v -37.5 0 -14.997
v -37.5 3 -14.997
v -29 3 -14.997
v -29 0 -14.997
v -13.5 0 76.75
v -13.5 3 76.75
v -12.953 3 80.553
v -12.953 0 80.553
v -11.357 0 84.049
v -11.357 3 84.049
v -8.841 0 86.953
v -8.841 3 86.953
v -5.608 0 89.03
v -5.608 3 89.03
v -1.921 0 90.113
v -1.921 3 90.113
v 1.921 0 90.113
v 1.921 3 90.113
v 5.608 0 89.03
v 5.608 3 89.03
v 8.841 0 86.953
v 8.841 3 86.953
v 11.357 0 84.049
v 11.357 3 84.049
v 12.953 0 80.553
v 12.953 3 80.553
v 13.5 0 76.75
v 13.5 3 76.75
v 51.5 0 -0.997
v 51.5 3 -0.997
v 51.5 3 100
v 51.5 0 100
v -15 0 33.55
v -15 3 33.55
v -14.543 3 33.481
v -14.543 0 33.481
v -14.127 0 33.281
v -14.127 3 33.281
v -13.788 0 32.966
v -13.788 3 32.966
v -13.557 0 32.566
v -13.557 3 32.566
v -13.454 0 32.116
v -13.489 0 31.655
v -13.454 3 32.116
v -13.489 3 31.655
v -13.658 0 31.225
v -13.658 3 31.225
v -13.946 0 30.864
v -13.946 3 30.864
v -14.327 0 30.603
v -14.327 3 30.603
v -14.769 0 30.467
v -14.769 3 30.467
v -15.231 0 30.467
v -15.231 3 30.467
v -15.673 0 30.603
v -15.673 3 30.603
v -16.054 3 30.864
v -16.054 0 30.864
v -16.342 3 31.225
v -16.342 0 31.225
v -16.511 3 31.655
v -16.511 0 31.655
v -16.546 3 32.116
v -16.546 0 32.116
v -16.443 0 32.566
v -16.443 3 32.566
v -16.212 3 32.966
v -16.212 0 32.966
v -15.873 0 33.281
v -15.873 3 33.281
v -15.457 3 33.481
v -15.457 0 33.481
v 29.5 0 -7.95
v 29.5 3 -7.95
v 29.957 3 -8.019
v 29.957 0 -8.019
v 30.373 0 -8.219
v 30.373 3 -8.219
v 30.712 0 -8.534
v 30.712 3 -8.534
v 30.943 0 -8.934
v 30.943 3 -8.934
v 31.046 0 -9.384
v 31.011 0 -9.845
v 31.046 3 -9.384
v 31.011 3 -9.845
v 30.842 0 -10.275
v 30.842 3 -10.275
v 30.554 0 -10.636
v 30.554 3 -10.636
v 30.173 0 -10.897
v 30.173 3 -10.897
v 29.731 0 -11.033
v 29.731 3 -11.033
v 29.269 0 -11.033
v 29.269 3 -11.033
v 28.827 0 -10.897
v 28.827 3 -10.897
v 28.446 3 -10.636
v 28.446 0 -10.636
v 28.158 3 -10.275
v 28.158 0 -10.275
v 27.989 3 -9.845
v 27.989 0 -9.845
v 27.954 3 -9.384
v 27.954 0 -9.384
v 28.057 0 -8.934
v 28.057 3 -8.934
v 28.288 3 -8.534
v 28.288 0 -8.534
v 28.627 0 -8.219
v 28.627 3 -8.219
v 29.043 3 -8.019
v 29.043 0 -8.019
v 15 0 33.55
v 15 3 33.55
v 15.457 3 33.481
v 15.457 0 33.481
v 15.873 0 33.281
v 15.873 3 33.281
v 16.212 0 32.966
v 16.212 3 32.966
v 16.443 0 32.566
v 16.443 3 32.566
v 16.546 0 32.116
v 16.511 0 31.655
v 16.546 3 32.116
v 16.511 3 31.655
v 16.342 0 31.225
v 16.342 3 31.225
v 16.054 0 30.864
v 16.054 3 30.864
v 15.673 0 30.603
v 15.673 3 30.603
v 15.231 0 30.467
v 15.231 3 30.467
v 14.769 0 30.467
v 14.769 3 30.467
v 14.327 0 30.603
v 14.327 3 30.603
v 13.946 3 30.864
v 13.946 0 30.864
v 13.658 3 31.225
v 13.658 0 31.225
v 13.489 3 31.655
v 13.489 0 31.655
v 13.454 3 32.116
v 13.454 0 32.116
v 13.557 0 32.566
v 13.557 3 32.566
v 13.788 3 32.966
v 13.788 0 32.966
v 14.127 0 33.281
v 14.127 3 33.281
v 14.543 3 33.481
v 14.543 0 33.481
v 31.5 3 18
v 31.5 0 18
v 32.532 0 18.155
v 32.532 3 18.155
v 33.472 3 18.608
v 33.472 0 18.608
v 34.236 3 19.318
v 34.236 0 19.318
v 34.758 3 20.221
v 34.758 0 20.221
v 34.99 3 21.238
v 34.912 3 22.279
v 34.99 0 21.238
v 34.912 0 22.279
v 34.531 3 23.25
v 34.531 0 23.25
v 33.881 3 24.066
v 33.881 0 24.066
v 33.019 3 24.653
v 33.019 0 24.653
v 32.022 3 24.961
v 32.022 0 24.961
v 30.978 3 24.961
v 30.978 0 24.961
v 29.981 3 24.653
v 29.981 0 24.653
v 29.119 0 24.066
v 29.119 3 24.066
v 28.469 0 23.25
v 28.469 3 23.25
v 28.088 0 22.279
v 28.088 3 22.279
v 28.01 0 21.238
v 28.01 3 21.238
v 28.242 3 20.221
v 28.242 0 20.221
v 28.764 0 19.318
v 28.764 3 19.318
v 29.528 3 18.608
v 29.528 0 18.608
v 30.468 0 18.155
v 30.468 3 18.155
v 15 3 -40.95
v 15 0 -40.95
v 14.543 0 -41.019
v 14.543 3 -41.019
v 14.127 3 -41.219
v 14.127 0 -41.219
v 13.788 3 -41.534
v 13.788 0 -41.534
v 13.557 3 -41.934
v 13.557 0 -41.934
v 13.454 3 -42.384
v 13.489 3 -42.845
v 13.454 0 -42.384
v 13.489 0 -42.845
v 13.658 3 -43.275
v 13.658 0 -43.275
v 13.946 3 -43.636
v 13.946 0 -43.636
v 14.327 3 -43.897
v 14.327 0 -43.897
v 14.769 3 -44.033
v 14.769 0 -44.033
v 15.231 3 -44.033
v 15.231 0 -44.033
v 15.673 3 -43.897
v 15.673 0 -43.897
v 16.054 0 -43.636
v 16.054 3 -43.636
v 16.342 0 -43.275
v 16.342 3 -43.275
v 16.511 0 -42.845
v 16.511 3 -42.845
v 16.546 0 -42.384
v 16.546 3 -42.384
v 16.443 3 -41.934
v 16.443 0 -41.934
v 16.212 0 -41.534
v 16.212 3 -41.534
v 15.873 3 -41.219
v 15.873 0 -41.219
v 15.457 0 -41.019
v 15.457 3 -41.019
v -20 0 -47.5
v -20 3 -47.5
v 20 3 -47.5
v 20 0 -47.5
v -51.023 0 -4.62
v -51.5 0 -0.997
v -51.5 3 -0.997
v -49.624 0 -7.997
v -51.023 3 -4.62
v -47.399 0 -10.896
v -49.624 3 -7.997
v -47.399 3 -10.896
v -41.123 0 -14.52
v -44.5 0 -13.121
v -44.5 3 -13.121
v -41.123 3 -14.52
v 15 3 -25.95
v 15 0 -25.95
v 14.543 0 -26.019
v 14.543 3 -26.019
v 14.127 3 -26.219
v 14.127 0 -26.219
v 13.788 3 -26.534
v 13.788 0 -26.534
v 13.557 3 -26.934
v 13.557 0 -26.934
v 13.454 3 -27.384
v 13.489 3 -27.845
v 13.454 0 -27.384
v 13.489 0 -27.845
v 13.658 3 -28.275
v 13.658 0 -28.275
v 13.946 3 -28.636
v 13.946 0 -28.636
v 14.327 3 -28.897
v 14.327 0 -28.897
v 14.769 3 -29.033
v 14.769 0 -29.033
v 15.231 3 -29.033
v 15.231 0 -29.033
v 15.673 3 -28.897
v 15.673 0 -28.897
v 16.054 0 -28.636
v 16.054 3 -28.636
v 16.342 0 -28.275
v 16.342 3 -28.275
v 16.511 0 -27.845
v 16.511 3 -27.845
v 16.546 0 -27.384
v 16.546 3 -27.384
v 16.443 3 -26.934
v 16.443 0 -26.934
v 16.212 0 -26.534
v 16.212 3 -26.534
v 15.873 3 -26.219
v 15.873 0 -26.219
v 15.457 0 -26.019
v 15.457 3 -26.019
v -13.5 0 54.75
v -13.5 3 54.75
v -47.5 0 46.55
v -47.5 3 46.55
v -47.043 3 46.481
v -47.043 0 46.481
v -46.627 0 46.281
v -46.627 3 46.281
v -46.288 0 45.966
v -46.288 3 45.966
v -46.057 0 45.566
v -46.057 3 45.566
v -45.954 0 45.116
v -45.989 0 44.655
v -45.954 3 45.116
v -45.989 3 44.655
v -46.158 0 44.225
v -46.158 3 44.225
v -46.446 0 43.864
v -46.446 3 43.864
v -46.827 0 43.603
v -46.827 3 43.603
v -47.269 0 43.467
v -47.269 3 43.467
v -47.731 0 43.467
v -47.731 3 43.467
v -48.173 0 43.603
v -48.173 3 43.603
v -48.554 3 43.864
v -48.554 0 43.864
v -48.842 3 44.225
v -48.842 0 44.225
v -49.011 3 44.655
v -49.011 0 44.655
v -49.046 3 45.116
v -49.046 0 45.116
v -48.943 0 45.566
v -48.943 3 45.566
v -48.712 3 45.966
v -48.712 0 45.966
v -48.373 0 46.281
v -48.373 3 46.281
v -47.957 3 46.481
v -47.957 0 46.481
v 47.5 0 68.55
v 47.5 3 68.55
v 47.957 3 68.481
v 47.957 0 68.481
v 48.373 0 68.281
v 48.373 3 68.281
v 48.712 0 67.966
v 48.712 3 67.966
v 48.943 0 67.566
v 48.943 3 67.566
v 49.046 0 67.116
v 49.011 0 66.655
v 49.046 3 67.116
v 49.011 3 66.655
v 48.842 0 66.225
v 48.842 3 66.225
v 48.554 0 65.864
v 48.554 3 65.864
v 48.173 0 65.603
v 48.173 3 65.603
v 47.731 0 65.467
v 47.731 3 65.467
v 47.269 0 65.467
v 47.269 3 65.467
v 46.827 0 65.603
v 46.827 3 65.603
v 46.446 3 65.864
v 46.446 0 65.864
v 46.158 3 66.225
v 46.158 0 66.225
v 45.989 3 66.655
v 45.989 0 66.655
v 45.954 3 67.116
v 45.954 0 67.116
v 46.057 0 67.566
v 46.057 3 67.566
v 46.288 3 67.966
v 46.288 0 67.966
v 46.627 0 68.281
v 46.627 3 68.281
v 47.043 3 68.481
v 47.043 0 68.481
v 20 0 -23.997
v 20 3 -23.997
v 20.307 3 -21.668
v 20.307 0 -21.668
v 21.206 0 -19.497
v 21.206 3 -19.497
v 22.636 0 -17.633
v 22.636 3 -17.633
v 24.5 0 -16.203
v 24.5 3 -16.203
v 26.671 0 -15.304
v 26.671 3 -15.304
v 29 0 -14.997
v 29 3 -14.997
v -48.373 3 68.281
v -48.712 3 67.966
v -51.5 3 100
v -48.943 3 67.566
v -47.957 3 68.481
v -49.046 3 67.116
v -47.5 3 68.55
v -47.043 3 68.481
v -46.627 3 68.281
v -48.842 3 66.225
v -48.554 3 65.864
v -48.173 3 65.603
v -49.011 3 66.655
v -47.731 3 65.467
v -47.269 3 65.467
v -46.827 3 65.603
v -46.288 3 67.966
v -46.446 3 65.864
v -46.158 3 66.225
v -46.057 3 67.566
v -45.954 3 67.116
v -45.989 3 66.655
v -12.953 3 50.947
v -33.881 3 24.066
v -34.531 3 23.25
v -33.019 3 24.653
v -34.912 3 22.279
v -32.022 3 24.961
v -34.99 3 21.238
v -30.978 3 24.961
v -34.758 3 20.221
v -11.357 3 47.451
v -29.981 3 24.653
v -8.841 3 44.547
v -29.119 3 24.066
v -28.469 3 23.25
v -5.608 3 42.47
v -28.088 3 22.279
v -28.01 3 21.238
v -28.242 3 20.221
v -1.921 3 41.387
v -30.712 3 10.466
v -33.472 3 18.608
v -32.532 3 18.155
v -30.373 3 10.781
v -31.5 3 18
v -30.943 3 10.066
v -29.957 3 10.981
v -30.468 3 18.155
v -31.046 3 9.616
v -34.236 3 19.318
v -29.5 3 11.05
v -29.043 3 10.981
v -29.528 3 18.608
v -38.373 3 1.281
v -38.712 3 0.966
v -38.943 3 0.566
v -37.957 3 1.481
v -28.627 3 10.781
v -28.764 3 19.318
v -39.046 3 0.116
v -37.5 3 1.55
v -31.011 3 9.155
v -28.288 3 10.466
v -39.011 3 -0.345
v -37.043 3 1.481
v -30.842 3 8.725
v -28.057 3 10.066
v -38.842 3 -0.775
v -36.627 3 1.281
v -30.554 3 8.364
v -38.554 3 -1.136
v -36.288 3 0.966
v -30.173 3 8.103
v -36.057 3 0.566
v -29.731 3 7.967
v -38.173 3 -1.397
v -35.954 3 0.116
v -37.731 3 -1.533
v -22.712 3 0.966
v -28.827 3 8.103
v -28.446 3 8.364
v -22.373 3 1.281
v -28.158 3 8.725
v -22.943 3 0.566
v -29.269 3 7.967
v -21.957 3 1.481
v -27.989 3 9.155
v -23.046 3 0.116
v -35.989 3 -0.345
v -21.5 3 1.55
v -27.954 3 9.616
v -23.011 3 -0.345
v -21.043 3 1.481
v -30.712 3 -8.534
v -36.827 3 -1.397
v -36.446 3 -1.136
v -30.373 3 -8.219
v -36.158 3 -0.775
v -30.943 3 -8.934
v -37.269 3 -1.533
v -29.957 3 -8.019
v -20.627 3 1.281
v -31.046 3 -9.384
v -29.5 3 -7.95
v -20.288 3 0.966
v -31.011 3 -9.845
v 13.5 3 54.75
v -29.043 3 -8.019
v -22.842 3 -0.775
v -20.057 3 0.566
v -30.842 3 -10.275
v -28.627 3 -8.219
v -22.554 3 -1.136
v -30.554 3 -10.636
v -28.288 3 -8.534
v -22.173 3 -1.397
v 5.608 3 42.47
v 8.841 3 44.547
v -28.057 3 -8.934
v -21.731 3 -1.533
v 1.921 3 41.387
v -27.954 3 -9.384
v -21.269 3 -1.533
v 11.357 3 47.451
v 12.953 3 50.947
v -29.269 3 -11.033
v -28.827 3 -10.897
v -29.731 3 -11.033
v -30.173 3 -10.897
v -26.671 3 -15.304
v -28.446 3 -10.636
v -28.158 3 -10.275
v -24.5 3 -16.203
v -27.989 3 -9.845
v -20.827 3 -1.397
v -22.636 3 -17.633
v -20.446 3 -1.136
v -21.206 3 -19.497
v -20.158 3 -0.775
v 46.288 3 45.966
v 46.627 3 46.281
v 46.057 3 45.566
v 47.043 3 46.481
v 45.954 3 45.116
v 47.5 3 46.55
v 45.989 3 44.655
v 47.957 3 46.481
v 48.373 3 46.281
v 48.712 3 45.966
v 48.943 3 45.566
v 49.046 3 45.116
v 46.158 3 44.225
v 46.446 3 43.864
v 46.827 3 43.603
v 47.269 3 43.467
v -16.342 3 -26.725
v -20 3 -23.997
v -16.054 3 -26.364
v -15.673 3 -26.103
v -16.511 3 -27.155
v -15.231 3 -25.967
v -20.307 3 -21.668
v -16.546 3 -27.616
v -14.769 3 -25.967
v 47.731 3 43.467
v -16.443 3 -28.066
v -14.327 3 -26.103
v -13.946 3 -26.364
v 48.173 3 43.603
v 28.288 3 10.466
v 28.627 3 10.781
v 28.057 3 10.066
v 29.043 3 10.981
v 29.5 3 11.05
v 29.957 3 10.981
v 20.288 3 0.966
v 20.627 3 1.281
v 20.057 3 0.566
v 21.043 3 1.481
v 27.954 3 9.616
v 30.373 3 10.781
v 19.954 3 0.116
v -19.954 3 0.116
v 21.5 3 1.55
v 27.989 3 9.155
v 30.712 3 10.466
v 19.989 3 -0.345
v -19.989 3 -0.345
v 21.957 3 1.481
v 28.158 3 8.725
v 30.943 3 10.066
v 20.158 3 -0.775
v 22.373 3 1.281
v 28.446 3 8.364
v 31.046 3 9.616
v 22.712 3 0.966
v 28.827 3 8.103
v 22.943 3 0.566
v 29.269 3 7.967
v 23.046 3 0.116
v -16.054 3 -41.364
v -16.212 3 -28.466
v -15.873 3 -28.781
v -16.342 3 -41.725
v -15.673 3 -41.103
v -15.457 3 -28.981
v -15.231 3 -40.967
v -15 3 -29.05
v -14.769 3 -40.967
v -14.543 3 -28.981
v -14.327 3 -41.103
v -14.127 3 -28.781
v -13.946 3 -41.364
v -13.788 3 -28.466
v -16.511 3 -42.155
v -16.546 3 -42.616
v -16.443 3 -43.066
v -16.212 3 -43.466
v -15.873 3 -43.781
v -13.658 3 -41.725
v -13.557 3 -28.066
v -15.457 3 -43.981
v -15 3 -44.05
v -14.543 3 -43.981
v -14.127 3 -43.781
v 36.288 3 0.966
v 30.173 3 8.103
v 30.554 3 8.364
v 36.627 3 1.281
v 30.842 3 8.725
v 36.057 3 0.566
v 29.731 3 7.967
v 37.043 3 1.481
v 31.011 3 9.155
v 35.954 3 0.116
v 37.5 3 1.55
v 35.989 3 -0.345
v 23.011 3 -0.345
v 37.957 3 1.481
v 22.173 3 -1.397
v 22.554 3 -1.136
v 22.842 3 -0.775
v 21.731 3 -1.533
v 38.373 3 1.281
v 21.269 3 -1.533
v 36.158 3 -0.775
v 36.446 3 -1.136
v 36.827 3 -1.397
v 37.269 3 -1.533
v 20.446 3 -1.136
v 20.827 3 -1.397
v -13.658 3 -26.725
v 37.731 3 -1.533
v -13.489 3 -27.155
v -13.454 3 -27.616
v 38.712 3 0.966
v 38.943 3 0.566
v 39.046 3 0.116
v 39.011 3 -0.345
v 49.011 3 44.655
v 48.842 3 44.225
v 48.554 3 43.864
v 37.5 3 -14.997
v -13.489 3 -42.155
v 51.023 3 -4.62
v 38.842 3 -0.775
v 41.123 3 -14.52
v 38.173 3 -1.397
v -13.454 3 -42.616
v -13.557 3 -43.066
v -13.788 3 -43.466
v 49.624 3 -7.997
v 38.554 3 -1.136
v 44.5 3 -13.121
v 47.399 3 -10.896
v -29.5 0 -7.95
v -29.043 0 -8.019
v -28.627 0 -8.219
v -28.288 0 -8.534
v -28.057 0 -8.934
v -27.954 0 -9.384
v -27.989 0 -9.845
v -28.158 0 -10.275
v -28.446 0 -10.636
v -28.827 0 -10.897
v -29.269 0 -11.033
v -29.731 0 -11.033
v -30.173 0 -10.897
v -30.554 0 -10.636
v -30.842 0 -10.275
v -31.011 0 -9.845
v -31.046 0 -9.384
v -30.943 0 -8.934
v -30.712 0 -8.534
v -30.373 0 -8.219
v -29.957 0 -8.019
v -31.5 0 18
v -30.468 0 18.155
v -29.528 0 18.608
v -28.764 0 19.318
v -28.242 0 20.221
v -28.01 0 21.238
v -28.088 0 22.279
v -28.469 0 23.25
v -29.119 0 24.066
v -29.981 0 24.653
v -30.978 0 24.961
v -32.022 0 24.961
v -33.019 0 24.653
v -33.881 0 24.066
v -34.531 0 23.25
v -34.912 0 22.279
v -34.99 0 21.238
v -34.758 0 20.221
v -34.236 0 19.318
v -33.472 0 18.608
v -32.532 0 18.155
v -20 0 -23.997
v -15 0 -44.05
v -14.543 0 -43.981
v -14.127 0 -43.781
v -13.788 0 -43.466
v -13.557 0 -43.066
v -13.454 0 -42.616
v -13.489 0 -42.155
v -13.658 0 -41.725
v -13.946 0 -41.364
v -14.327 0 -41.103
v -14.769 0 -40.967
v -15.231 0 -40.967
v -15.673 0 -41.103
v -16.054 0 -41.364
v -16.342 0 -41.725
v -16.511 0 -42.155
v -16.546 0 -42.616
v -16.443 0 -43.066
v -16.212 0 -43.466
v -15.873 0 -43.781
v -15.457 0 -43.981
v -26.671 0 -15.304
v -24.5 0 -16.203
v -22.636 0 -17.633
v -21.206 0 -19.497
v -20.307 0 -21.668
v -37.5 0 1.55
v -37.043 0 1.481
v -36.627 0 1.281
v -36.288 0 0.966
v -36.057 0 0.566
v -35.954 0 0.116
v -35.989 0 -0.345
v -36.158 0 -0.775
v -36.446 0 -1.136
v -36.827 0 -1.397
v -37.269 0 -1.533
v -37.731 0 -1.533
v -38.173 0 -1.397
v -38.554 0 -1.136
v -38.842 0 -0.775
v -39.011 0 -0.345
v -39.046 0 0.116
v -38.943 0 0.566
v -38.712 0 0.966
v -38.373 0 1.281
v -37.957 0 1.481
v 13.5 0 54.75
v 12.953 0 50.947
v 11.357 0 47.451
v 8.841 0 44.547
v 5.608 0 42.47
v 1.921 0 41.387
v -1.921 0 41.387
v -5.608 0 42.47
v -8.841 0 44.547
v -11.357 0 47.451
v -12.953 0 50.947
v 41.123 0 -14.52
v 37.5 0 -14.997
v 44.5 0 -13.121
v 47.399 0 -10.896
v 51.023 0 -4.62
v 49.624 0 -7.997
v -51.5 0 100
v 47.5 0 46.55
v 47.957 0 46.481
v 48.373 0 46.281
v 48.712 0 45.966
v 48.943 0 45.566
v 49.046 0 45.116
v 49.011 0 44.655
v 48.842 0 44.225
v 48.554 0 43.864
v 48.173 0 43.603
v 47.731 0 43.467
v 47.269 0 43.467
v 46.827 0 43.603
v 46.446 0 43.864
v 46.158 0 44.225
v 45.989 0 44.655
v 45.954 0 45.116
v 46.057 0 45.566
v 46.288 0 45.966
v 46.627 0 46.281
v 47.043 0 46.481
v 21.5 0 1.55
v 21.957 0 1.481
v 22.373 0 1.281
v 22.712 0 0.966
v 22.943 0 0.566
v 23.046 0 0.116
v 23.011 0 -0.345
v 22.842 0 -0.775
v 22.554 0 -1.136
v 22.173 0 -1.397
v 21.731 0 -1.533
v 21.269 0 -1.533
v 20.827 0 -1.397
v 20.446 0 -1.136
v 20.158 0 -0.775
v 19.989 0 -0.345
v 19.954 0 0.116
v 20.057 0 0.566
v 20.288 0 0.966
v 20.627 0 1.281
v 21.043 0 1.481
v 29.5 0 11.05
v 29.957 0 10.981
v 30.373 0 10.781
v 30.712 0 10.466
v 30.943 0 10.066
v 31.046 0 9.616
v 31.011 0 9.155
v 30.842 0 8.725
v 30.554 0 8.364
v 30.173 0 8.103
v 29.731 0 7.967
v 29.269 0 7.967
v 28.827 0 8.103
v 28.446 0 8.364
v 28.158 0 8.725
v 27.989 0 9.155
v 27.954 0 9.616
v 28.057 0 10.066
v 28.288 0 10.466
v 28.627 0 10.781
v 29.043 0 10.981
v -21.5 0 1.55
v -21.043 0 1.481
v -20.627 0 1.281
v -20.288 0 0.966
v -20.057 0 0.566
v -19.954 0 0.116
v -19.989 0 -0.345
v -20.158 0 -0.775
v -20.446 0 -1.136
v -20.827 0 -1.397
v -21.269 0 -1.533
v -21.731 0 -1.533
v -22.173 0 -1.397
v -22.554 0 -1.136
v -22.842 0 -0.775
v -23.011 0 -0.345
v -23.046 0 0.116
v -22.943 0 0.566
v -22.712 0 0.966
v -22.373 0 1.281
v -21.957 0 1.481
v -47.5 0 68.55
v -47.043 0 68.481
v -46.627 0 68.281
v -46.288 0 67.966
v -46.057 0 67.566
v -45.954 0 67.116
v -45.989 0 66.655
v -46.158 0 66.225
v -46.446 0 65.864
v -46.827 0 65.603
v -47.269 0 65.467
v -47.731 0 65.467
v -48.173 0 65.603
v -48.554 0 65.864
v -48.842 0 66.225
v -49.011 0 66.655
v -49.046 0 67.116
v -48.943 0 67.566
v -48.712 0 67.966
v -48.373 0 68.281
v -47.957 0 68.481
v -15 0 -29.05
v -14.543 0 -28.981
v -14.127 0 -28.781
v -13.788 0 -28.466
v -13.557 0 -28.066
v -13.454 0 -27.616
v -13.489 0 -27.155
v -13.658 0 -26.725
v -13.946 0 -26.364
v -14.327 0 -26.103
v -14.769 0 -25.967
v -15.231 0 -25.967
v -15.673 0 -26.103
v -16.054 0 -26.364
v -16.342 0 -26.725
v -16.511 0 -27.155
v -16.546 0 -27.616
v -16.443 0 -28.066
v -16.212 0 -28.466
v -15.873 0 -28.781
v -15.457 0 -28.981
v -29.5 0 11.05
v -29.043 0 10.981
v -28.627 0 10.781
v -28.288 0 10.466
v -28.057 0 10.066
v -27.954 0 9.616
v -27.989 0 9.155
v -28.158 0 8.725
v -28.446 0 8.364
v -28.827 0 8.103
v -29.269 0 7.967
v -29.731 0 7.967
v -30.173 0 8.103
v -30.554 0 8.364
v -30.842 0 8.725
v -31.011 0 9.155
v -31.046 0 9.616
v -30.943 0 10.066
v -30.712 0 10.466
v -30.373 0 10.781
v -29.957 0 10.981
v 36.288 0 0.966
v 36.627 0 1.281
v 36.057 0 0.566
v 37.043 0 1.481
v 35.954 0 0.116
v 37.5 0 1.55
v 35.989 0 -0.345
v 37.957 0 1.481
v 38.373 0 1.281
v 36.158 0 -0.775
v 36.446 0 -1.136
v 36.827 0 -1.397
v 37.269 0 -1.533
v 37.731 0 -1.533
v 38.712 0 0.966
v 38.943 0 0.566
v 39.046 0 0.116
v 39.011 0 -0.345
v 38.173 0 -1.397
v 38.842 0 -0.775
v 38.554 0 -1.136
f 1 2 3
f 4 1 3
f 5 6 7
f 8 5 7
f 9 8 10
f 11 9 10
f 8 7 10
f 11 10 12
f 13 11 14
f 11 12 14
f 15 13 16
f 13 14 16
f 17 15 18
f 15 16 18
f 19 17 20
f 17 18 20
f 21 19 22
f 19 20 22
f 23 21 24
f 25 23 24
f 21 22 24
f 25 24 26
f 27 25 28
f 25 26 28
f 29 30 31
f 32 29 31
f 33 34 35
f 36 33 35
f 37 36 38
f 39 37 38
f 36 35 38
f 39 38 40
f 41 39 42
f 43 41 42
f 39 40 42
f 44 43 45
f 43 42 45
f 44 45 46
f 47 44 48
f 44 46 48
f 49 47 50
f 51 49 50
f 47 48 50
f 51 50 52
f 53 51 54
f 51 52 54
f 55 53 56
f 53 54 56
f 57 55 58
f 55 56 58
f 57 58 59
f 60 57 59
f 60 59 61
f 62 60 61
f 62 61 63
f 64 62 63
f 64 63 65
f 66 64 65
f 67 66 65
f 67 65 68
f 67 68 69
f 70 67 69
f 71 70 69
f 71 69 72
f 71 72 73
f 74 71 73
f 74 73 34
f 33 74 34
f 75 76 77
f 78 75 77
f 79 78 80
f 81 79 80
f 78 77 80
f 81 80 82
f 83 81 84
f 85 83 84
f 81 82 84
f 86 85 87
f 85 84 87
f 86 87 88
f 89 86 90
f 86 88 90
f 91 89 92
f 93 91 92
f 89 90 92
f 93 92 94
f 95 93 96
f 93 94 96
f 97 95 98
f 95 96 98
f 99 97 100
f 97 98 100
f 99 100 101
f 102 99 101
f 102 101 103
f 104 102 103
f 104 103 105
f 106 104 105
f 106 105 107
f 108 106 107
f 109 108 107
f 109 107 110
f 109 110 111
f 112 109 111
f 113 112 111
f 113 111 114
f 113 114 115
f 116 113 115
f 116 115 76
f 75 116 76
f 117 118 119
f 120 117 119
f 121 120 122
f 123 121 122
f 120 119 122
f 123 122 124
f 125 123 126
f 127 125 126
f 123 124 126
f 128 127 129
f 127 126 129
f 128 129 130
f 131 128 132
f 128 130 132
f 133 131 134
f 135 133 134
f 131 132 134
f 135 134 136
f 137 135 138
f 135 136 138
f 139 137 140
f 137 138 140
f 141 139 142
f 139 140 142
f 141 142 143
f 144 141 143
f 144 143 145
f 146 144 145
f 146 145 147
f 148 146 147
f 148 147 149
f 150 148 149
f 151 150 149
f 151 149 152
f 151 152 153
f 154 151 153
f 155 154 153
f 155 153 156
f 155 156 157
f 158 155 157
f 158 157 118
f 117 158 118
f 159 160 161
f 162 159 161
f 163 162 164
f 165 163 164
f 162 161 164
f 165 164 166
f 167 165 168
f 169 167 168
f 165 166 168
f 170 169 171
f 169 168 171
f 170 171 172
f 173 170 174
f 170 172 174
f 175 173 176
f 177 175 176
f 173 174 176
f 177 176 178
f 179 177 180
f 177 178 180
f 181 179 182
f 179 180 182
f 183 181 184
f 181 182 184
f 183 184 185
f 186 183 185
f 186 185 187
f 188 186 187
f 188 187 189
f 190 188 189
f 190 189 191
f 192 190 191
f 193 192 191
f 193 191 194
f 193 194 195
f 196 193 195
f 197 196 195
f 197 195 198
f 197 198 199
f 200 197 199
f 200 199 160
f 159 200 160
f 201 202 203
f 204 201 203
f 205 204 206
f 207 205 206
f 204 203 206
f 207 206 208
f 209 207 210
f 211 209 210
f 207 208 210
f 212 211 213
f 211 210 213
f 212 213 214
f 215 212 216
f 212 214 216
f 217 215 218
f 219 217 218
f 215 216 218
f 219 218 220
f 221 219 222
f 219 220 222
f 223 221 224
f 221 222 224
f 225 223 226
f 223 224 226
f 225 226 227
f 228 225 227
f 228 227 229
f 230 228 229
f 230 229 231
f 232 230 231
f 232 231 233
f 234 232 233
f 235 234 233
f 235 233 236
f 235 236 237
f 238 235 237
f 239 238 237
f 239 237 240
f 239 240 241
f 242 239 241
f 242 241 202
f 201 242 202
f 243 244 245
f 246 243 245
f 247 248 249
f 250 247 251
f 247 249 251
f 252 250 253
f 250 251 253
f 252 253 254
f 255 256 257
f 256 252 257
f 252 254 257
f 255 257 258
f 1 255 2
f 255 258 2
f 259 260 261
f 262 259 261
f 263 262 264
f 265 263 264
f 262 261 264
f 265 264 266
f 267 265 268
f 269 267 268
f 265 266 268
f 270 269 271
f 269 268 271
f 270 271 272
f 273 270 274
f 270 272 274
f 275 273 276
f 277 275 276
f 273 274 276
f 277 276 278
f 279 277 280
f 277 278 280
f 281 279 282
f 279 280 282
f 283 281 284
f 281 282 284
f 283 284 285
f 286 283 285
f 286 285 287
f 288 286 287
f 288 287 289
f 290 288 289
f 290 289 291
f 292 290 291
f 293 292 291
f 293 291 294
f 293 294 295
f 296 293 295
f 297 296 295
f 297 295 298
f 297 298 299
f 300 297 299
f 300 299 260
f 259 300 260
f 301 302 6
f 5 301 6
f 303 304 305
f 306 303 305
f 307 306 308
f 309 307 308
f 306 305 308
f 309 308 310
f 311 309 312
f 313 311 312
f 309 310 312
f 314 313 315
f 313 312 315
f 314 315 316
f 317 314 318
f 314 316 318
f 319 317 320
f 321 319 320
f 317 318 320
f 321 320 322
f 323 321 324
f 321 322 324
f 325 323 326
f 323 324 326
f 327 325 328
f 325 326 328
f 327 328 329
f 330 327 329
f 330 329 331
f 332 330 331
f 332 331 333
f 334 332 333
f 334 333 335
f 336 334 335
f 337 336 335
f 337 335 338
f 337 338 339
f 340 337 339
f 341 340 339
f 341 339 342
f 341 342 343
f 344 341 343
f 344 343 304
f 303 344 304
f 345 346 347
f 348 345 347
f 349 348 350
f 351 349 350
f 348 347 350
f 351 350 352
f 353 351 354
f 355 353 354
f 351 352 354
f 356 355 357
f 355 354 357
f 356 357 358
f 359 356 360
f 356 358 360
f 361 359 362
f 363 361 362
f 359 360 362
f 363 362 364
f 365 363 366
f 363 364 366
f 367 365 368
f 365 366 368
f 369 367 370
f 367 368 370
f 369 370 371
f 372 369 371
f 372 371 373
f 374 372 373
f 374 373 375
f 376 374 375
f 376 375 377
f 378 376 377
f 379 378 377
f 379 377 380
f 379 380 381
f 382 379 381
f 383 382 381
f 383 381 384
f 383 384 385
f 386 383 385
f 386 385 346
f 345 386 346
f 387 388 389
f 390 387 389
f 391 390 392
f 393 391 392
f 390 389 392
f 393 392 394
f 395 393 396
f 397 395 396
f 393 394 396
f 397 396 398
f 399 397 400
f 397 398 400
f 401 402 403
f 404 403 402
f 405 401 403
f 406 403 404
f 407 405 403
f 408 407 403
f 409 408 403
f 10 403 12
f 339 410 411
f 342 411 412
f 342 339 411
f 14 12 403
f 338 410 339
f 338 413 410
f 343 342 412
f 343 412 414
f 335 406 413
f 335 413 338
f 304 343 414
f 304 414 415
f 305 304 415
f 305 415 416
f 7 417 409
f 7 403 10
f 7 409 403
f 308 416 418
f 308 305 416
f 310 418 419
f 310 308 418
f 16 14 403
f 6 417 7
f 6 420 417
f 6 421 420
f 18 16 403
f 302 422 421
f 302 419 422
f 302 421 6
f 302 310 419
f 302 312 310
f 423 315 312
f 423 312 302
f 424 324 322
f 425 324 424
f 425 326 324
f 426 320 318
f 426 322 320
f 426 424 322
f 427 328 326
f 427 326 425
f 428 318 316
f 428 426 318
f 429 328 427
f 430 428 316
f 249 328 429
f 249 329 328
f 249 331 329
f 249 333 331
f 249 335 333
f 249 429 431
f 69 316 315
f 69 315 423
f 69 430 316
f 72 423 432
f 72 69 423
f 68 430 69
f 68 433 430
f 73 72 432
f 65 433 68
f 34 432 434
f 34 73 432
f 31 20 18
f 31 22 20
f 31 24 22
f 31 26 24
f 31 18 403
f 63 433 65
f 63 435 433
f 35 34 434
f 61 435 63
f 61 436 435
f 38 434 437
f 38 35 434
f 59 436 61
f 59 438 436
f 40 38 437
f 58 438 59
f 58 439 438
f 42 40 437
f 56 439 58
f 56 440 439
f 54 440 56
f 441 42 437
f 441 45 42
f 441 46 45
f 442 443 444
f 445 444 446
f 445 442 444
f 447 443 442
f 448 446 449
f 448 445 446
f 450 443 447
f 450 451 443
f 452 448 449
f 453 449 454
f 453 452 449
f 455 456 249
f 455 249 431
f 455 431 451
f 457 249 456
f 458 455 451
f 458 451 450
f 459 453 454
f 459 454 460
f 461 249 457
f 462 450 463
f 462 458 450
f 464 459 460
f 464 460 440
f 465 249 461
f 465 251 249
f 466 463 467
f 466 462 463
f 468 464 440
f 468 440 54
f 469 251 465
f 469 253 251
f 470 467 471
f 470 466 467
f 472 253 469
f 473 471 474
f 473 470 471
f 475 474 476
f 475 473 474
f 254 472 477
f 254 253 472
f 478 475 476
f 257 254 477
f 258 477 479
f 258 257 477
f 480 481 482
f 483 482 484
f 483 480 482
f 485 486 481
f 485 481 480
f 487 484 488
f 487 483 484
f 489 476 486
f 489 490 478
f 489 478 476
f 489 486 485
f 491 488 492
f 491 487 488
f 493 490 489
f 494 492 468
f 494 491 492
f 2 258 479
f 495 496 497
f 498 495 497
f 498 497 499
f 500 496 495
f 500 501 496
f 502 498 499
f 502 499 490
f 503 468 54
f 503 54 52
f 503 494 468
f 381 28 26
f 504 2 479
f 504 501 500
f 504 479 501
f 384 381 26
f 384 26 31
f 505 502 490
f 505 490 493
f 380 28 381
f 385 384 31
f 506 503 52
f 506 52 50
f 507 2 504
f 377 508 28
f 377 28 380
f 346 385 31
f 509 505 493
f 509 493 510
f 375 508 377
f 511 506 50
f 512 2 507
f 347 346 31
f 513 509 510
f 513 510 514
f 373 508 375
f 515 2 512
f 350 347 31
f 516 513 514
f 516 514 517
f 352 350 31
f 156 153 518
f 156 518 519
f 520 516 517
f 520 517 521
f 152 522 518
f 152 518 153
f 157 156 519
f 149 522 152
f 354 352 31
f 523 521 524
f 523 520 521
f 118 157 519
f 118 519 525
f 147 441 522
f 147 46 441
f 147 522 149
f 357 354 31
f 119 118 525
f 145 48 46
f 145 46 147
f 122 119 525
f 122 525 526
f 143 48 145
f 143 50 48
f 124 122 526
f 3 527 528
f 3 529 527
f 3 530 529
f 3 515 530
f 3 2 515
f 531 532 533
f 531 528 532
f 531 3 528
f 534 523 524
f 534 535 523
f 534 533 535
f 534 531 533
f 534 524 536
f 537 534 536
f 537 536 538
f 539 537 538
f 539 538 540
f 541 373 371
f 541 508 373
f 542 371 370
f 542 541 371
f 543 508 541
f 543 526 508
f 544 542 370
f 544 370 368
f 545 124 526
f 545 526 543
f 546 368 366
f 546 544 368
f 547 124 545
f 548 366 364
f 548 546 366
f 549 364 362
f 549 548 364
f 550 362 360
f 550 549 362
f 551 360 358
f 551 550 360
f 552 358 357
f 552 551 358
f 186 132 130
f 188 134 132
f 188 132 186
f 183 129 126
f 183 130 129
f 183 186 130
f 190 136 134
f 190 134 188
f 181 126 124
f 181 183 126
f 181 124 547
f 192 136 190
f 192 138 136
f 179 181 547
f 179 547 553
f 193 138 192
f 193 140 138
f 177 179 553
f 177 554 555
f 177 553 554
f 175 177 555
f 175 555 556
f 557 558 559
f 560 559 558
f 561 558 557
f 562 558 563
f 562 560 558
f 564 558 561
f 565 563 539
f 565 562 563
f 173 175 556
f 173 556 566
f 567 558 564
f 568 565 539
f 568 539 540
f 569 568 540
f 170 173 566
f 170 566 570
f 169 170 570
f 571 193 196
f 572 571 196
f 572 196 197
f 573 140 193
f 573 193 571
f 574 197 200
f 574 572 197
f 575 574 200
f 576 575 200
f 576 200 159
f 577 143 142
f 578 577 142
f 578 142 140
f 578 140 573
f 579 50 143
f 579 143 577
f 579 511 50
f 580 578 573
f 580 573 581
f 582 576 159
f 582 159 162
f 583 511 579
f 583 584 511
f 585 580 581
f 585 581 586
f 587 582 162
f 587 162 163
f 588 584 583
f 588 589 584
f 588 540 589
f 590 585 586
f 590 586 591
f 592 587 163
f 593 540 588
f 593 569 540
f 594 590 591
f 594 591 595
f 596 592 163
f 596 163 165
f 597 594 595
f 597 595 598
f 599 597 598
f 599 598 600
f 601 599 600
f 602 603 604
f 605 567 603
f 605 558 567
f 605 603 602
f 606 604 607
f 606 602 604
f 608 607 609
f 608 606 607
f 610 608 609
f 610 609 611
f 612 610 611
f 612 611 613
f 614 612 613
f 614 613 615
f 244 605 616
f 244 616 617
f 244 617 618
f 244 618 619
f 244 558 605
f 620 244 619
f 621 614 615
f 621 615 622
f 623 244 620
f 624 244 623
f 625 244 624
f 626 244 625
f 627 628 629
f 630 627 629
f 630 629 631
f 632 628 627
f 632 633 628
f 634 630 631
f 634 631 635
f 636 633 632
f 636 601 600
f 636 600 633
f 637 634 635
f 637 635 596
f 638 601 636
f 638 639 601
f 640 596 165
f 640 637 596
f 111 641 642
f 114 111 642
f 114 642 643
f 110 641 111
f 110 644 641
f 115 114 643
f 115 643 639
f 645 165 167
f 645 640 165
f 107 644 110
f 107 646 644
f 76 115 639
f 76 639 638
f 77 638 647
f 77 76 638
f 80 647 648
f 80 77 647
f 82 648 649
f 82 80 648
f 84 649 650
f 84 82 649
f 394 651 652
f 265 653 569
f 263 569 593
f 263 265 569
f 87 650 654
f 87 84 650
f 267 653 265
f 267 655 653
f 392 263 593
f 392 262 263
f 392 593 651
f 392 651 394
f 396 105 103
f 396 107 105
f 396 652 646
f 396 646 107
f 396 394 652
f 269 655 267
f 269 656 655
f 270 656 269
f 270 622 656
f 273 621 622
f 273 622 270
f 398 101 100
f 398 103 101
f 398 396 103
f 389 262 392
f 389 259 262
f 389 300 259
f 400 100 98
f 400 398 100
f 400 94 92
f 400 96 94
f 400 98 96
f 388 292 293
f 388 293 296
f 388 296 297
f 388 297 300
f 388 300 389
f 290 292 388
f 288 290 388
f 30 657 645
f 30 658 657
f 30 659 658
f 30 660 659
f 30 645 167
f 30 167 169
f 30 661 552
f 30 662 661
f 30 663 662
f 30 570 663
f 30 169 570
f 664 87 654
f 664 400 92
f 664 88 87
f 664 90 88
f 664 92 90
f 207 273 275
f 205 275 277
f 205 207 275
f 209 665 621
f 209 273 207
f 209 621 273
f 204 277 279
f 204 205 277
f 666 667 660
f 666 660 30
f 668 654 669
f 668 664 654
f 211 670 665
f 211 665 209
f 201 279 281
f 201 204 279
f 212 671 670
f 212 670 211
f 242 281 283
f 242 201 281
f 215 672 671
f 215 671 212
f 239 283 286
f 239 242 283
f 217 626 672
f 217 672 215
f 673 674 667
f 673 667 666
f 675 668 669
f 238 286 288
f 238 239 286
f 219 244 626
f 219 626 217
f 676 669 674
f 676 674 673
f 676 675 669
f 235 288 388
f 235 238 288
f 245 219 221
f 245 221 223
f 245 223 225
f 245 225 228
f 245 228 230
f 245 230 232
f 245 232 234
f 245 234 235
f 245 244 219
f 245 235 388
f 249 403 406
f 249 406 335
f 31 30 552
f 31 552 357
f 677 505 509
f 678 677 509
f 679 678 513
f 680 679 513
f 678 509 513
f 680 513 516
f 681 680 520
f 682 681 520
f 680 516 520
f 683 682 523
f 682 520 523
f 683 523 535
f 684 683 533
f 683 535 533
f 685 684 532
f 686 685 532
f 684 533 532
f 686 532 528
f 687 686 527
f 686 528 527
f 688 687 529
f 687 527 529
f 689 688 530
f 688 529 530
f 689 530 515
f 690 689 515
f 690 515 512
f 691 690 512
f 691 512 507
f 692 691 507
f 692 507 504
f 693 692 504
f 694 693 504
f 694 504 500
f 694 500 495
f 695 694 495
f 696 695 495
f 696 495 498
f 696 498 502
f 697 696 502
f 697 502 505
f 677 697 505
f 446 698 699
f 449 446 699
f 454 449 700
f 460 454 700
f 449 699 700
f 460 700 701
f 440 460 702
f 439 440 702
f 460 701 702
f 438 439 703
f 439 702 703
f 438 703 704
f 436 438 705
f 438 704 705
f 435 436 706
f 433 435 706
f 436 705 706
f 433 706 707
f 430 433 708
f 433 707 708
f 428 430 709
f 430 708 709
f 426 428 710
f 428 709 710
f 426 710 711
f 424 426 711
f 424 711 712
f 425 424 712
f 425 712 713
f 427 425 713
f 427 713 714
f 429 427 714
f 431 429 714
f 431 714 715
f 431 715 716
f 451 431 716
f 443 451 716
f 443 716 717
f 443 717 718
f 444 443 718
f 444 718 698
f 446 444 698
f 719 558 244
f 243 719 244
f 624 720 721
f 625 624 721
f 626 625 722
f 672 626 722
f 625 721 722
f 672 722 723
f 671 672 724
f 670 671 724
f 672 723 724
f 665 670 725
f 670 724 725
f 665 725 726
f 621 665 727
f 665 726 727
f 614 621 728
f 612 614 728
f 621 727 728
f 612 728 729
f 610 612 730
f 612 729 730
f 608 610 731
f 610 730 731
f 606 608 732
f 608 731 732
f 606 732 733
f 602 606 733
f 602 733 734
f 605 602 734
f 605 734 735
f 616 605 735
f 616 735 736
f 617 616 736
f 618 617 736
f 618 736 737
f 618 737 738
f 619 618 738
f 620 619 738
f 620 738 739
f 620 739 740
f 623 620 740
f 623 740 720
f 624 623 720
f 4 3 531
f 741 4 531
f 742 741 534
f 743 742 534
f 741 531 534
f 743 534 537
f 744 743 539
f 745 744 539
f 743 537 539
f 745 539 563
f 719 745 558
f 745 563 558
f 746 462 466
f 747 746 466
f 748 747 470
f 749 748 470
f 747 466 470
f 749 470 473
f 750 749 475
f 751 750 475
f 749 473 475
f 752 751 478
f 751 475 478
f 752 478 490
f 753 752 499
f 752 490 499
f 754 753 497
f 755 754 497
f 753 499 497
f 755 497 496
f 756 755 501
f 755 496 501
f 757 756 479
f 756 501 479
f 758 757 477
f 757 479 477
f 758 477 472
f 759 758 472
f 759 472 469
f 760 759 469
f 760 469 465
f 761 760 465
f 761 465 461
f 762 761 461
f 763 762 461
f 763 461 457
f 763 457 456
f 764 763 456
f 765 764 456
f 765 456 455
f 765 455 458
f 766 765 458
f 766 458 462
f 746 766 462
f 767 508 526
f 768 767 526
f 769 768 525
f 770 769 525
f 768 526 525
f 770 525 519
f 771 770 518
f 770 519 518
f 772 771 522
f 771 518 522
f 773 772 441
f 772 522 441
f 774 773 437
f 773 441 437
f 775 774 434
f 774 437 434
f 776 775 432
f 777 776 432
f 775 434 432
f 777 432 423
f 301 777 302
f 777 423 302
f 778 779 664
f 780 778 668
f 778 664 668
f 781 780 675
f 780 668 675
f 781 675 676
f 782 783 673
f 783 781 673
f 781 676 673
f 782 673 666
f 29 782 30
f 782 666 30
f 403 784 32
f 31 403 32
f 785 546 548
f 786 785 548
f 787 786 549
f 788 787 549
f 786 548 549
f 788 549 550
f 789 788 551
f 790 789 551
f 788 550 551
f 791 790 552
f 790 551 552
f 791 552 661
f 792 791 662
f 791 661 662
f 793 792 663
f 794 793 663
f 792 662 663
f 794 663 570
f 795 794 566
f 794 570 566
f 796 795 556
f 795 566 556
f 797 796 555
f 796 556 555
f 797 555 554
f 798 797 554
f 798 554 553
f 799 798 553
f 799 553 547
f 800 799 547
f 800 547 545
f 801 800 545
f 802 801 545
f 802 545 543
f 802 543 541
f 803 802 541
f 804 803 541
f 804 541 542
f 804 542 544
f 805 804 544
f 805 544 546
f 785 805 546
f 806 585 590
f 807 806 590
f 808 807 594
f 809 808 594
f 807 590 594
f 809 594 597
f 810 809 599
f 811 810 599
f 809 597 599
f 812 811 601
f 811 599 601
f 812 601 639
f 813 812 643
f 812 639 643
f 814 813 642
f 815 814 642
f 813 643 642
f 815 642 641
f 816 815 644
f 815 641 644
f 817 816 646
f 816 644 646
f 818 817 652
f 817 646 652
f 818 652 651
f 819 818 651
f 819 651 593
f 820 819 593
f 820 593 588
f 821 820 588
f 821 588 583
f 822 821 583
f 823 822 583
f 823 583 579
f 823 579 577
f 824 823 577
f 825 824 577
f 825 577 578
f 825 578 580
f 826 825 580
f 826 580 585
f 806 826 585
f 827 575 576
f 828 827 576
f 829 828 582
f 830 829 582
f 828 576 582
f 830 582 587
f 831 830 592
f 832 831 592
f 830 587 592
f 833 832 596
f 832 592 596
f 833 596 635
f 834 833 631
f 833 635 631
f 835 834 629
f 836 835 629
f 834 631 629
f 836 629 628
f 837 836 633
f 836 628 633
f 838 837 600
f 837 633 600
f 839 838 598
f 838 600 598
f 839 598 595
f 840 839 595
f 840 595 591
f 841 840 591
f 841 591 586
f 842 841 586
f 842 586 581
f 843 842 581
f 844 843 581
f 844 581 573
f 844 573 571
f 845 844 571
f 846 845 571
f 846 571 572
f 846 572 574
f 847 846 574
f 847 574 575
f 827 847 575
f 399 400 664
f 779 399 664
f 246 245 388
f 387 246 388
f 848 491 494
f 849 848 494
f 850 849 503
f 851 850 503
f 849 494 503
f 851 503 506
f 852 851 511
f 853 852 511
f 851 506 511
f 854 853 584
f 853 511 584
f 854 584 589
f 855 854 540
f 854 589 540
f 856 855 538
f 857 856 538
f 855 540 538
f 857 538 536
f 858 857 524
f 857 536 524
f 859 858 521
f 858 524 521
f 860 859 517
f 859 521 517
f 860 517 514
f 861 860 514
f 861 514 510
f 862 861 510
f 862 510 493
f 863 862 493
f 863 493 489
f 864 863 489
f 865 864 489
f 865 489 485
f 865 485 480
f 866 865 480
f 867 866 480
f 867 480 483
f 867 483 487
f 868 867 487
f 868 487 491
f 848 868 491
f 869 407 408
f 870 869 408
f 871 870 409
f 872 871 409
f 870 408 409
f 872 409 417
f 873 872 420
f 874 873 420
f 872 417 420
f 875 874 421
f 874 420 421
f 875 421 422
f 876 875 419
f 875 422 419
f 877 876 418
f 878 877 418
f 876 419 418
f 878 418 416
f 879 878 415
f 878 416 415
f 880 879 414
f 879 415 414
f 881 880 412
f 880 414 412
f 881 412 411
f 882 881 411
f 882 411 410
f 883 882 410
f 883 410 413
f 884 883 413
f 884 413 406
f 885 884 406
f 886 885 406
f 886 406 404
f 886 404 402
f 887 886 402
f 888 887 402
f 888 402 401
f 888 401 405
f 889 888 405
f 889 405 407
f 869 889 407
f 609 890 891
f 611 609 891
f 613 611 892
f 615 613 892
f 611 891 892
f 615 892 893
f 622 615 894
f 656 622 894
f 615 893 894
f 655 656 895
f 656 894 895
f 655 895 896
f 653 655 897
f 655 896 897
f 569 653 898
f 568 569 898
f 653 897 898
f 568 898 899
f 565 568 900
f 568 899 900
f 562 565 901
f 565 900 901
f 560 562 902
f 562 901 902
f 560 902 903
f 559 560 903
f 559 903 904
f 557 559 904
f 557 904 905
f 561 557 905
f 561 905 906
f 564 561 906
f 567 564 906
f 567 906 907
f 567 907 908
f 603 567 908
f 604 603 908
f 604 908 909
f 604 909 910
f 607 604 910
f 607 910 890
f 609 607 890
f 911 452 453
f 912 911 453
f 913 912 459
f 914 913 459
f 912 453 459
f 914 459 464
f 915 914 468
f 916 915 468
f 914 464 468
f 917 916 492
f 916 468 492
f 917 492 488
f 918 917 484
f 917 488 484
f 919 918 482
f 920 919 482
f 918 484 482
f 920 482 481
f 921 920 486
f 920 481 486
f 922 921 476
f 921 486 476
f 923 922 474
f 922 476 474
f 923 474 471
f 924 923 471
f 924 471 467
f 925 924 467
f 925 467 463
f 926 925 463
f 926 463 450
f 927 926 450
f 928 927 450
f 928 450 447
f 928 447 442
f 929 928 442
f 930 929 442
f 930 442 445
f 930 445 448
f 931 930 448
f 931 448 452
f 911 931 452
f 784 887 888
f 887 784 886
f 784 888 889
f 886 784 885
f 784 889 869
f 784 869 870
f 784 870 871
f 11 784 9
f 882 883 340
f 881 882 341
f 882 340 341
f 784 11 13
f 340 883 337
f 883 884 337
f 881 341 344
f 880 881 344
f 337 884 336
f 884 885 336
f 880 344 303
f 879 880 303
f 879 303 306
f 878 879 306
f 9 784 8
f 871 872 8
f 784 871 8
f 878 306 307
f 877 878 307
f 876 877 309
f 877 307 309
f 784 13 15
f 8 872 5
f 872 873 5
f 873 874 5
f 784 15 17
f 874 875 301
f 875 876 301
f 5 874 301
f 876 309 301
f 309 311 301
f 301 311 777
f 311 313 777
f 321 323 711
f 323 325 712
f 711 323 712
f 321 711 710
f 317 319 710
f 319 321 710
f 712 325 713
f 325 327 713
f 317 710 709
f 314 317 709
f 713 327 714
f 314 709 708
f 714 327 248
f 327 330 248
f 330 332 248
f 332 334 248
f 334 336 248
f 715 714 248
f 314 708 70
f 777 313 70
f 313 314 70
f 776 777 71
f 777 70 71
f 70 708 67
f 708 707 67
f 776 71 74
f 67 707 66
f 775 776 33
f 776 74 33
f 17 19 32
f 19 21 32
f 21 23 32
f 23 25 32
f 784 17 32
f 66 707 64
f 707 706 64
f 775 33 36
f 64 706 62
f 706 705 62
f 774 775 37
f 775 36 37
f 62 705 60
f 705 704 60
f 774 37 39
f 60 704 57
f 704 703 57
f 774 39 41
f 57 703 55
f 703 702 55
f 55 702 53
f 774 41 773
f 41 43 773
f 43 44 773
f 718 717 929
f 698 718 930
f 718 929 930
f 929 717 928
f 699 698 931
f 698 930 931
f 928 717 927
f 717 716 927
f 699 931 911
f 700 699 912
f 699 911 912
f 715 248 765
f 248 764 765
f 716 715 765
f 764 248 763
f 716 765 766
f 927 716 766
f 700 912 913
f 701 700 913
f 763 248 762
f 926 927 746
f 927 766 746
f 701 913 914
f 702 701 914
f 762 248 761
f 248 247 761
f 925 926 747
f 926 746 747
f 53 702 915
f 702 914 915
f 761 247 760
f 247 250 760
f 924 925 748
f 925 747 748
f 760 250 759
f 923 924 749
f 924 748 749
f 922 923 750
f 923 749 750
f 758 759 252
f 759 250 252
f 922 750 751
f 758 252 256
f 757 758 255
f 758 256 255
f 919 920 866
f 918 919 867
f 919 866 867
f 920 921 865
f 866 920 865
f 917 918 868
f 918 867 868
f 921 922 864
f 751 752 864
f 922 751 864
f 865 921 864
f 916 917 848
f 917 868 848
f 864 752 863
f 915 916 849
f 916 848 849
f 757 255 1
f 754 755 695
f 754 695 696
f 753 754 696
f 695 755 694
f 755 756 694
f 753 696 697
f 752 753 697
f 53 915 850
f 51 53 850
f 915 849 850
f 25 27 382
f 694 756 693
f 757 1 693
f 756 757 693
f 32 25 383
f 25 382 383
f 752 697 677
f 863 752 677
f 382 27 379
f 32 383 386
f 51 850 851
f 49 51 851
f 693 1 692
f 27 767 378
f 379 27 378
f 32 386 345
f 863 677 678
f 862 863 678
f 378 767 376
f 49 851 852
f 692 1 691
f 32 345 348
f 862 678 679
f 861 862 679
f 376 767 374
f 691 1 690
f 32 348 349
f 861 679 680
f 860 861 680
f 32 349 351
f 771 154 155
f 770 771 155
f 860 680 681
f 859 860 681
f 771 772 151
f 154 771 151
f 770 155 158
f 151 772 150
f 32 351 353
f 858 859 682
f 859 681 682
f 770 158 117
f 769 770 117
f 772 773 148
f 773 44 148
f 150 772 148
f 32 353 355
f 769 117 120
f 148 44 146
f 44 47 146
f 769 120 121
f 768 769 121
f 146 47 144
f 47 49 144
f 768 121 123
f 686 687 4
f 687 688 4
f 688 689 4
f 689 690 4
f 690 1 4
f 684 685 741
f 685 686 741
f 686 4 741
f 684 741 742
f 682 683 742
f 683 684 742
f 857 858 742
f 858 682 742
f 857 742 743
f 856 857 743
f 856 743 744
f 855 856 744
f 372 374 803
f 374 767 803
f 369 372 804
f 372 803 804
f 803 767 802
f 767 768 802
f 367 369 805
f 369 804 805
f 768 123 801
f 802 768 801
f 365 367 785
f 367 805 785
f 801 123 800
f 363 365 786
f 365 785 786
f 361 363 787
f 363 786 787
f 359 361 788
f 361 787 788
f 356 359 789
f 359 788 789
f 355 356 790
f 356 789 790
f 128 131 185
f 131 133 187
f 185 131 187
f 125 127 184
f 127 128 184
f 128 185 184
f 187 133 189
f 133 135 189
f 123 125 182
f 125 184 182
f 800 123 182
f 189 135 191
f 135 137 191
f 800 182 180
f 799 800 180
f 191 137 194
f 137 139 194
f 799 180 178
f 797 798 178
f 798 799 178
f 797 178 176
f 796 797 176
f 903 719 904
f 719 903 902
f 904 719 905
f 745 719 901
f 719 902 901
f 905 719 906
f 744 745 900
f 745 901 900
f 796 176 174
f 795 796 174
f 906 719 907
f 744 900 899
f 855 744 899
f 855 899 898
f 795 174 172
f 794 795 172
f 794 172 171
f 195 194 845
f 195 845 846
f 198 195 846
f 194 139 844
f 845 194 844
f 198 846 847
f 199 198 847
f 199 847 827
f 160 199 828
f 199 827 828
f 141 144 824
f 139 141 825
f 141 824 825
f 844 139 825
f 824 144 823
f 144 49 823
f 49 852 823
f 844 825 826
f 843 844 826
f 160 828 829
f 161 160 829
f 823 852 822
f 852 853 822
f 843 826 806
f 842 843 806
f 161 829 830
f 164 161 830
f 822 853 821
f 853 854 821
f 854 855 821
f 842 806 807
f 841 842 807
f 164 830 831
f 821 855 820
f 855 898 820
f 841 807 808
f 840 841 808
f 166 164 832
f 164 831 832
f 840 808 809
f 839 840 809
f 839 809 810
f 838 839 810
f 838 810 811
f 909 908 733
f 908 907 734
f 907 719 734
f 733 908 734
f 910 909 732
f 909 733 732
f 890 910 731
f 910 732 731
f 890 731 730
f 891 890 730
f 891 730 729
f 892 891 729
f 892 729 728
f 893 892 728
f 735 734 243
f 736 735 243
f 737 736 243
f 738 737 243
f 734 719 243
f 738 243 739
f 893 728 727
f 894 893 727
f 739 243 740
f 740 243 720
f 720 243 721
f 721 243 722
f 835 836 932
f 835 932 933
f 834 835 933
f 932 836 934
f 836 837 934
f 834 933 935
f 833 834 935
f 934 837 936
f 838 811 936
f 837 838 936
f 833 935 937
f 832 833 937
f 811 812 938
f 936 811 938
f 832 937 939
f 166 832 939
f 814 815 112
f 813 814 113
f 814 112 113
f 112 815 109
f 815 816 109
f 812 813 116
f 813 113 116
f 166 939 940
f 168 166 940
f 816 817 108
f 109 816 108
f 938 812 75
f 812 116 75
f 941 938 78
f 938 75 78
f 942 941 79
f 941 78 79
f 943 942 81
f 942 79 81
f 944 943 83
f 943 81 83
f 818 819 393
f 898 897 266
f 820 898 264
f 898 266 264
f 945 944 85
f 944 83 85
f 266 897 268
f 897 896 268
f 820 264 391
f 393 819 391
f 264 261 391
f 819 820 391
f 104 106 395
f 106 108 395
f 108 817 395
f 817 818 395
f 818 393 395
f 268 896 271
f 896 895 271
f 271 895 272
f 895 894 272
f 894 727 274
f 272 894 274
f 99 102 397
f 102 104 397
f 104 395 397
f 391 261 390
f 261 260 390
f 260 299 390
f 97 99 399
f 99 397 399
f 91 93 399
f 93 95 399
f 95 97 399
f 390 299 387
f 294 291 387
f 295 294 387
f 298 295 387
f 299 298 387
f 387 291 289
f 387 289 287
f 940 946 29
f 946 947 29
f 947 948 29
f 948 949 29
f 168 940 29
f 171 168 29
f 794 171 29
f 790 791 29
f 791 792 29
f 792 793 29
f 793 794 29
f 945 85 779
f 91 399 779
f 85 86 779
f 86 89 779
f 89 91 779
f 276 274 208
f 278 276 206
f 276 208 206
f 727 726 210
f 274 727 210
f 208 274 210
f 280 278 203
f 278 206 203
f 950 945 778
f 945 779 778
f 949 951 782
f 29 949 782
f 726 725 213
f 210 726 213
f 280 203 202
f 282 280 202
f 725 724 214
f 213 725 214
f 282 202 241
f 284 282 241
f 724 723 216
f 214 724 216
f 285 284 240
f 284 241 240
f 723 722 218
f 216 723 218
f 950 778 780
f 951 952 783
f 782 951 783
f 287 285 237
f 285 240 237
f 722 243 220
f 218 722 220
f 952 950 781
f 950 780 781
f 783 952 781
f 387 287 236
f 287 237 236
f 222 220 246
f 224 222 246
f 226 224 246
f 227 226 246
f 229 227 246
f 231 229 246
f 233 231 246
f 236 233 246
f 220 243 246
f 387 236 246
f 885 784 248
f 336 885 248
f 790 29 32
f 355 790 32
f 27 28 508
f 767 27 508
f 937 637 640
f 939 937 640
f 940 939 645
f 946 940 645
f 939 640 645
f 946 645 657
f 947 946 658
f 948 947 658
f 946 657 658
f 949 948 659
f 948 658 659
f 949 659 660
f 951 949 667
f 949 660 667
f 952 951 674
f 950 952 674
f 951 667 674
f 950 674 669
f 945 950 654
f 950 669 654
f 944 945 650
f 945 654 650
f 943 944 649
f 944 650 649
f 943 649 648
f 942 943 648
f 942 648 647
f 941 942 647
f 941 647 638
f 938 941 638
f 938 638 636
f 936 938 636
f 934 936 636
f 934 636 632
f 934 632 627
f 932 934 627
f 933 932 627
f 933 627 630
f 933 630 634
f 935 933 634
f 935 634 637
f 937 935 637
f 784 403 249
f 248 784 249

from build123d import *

# Parameters (mm, degrees)
SKETCH_1_W              = 200
SKETCH_1_H              = 200
EXTRUDE_1_DEPTH         = 3
SKETCH_2_R              = 1.55
CUT_EXTRUDE_2_DEPTH     = 10
CUT_EXTRUDE_3_DEPTH     = 10
SKETCH_6_R              = 1.55
CUT_EXTRUDE_3_1_1_DEPTH = 10
SKETCH_7_R              = 1.55
CUT_EXTRUDE_3_1_2_DEPTH = 113.522220028
CUT_EXTRUDE_21_DEPTH    = 10
CUT_EXTRUDE_6_REACH     = 114.522
SKETCH_10_R             = 3.5


with BuildPart() as part:
    # 草图1 → 凸台-拉伸1 (new body)
    with BuildSketch(Plane(origin=(0, 0, 0), x_dir=(1, 0, 0), z_dir=(0, 1, 0))):
        Rectangle(SKETCH_1_W, SKETCH_1_H)
    extrude(amount=EXTRUDE_1_DEPTH)

    # 草图2 → 切除-拉伸2 (cut)
    with BuildSketch(Plane(origin=(0, 3, 0), x_dir=(1, 0, 0), z_dir=(0, 1, 0))):
        with Locations(Location((29.5, 9.5, 0), (0, 0, 270))):
            Circle(SKETCH_2_R)
        with Locations(Location((21.5, 0, 0), (0, 0, 270))):
            Circle(SKETCH_2_R)
        with Locations(Location((29.5, -9.5, 0), (0, 0, 270))):
            Circle(SKETCH_2_R)
        with Locations(Location((37.5, 0, 0), (0, 0, 270))):
            Circle(SKETCH_2_R)
        with Locations(Location((-29.5, -9.5, 0), (0, 0, 270))):
            Circle(SKETCH_2_R)
        with Locations(Location((-37.5, 0, 0), (0, 0, 270))):
            Circle(SKETCH_2_R)
        with Locations(Location((-21.5, 0, 0), (0, 0, 270))):
            Circle(SKETCH_2_R)
        with Locations(Location((-29.5, 9.5, 0), (0, 0, 270))):
            Circle(SKETCH_2_R)
        with Locations(Location((-15, -32, 0), (0, 0, 270))):
            Circle(SKETCH_2_R)
        with Locations(Location((15, -32, 0), (0, 0, 270))):
            Circle(SKETCH_2_R)
    extrude(amount=-CUT_EXTRUDE_2_DEPTH, mode=Mode.SUBTRACT)

    # 草图5 → 切除-拉伸3 (cut)
    with BuildSketch(Plane(origin=(0, 3, 0), x_dir=(1, 0, 0), z_dir=(0, 1, 0))):
        with BuildLine():
            Line((-51.5, -100), (-51.5, 0))
            Line((-51.5, 0), (-51.5, 0.9969997))
            ThreePointArc((-51.5, 0.9969997), (-47.399494937, 10.896494637), (-37.5, 14.9969997))
            Line((-37.5, 14.9969997), (-29, 14.9969997))
            ThreePointArc((-29, 14.9969997), (-22.636038969, 17.633038669), (-20, 23.9969997))
            Line((-20, 23.9969997), (-20, 24.9949995))
            Line((-20, 24.9949995), (-20, 47.5))
            Line((-20, 47.5), (0, 47.5))
            Line((0, 47.5), (20, 47.5))
            Line((20, 47.5), (20, 24.9949995))
            Line((20, 24.9949995), (20, 23.9969997))
            ThreePointArc((20, 23.9969997), (22.636038969, 17.633038669), (29, 14.9969997))
            Line((29, 14.9969997), (37.5, 14.9969997))
            ThreePointArc((37.5, 14.9969997), (47.399494937, 10.896494637), (51.5, 0.9969997))
            Line((51.5, 0.9969997), (51.5, 0))
            Line((51.5, 0), (51.5, -100))
            Line((51.5, -100), (100, -100))
            Line((100, -100), (100, 100))
            Line((100, 100), (-100, 100))
            Line((-100, 100), (-100, -100))
            Line((-100, -100), (-51.5, -100))
        make_face()
    extrude(amount=-CUT_EXTRUDE_3_DEPTH, mode=Mode.SUBTRACT)

    # 草图6 → φ3.1通孔1 (cut)
    with BuildSketch(Plane.XZ):
        with Locations(Location((-15, -42.5, 0), (0, 0, 270))):
            Circle(SKETCH_6_R)
        with Locations(Location((-15, -27.5, 0), (0, 0, 270))):
            Circle(SKETCH_6_R)
        with Locations(Location((15, -27.5, 0), (0, 0, 90))):
            Circle(SKETCH_6_R)
        with Locations(Location((15, -42.5, 0), (0, 0, 90))):
            Circle(SKETCH_6_R)
    extrude(amount=-CUT_EXTRUDE_3_1_1_DEPTH, mode=Mode.SUBTRACT)

    # 草图7 → φ3.1通孔2 (cut, through all)
    with BuildSketch(Plane(origin=(0, 3, 0), x_dir=(1, 0, 0), z_dir=(0, 1, 0))):
        with Locations(Location((-47.5, -45, 0), (0, 0, 270))):
            Circle(SKETCH_7_R)
        with Locations(Location((-47.5, -67, 0), (0, 0, 270))):
            Circle(SKETCH_7_R)
        with Locations(Location((47.5, -45, 0), (0, 0, 270))):
            Circle(SKETCH_7_R)
        with Locations(Location((47.5, -67, 0), (0, 0, 270))):
            Circle(SKETCH_7_R)
    extrude(amount=-CUT_EXTRUDE_3_1_2_DEPTH, mode=Mode.SUBTRACT)

    # 草图9 → φ21拨单电机孔 (cut)
    with BuildSketch(Plane(origin=(0, 3, 0), x_dir=(1, 0, 0), z_dir=(0, 1, 0))):
        with BuildLine():
            Line((-13.5, -54.75), (-13.5, -76.75))
            ThreePointArc((-13.5, -76.75), (0, -90.25), (13.5, -76.75))
            Line((13.5, -76.75), (13.5, -54.75))
            ThreePointArc((13.5, -54.75), (0, -41.25), (-13.5, -54.75))
        make_face()
    extrude(amount=-CUT_EXTRUDE_21_DEPTH, mode=Mode.SUBTRACT)

    # 草图10 → 切除-拉伸6 (cut, up to next)
    with BuildSketch(Plane.XZ, mode=Mode.PRIVATE) as cut_extrude_6_sk1:
        with Locations(Location((-31.5, 21.5, 0), (0, 0, 270))):
            Circle(SKETCH_10_R)
    cut_extrude_6_tool1 = extrude(cut_extrude_6_sk1.sketch, amount=-CUT_EXTRUDE_6_REACH, mode=Mode.PRIVATE) & part.part
    # 草图10 → 切除-拉伸6 (cut, up to next)
    with BuildSketch(Plane.XZ, mode=Mode.PRIVATE) as cut_extrude_6_sk2:
        with Locations(Location((31.5, 21.5, 0), (0, 0, 270))):
            Circle(SKETCH_10_R)
    cut_extrude_6_tool2 = extrude(cut_extrude_6_sk2.sketch, amount=-CUT_EXTRUDE_6_REACH, mode=Mode.PRIVATE) & part.part
    add(cut_extrude_6_tool1.solids().sort_by_distance((-31.5, 0, 21.5))[0], mode=Mode.SUBTRACT)
    add(cut_extrude_6_tool2.solids().sort_by_distance((31.5, 0, 21.5))[0], mode=Mode.SUBTRACT)


solid = part.part
